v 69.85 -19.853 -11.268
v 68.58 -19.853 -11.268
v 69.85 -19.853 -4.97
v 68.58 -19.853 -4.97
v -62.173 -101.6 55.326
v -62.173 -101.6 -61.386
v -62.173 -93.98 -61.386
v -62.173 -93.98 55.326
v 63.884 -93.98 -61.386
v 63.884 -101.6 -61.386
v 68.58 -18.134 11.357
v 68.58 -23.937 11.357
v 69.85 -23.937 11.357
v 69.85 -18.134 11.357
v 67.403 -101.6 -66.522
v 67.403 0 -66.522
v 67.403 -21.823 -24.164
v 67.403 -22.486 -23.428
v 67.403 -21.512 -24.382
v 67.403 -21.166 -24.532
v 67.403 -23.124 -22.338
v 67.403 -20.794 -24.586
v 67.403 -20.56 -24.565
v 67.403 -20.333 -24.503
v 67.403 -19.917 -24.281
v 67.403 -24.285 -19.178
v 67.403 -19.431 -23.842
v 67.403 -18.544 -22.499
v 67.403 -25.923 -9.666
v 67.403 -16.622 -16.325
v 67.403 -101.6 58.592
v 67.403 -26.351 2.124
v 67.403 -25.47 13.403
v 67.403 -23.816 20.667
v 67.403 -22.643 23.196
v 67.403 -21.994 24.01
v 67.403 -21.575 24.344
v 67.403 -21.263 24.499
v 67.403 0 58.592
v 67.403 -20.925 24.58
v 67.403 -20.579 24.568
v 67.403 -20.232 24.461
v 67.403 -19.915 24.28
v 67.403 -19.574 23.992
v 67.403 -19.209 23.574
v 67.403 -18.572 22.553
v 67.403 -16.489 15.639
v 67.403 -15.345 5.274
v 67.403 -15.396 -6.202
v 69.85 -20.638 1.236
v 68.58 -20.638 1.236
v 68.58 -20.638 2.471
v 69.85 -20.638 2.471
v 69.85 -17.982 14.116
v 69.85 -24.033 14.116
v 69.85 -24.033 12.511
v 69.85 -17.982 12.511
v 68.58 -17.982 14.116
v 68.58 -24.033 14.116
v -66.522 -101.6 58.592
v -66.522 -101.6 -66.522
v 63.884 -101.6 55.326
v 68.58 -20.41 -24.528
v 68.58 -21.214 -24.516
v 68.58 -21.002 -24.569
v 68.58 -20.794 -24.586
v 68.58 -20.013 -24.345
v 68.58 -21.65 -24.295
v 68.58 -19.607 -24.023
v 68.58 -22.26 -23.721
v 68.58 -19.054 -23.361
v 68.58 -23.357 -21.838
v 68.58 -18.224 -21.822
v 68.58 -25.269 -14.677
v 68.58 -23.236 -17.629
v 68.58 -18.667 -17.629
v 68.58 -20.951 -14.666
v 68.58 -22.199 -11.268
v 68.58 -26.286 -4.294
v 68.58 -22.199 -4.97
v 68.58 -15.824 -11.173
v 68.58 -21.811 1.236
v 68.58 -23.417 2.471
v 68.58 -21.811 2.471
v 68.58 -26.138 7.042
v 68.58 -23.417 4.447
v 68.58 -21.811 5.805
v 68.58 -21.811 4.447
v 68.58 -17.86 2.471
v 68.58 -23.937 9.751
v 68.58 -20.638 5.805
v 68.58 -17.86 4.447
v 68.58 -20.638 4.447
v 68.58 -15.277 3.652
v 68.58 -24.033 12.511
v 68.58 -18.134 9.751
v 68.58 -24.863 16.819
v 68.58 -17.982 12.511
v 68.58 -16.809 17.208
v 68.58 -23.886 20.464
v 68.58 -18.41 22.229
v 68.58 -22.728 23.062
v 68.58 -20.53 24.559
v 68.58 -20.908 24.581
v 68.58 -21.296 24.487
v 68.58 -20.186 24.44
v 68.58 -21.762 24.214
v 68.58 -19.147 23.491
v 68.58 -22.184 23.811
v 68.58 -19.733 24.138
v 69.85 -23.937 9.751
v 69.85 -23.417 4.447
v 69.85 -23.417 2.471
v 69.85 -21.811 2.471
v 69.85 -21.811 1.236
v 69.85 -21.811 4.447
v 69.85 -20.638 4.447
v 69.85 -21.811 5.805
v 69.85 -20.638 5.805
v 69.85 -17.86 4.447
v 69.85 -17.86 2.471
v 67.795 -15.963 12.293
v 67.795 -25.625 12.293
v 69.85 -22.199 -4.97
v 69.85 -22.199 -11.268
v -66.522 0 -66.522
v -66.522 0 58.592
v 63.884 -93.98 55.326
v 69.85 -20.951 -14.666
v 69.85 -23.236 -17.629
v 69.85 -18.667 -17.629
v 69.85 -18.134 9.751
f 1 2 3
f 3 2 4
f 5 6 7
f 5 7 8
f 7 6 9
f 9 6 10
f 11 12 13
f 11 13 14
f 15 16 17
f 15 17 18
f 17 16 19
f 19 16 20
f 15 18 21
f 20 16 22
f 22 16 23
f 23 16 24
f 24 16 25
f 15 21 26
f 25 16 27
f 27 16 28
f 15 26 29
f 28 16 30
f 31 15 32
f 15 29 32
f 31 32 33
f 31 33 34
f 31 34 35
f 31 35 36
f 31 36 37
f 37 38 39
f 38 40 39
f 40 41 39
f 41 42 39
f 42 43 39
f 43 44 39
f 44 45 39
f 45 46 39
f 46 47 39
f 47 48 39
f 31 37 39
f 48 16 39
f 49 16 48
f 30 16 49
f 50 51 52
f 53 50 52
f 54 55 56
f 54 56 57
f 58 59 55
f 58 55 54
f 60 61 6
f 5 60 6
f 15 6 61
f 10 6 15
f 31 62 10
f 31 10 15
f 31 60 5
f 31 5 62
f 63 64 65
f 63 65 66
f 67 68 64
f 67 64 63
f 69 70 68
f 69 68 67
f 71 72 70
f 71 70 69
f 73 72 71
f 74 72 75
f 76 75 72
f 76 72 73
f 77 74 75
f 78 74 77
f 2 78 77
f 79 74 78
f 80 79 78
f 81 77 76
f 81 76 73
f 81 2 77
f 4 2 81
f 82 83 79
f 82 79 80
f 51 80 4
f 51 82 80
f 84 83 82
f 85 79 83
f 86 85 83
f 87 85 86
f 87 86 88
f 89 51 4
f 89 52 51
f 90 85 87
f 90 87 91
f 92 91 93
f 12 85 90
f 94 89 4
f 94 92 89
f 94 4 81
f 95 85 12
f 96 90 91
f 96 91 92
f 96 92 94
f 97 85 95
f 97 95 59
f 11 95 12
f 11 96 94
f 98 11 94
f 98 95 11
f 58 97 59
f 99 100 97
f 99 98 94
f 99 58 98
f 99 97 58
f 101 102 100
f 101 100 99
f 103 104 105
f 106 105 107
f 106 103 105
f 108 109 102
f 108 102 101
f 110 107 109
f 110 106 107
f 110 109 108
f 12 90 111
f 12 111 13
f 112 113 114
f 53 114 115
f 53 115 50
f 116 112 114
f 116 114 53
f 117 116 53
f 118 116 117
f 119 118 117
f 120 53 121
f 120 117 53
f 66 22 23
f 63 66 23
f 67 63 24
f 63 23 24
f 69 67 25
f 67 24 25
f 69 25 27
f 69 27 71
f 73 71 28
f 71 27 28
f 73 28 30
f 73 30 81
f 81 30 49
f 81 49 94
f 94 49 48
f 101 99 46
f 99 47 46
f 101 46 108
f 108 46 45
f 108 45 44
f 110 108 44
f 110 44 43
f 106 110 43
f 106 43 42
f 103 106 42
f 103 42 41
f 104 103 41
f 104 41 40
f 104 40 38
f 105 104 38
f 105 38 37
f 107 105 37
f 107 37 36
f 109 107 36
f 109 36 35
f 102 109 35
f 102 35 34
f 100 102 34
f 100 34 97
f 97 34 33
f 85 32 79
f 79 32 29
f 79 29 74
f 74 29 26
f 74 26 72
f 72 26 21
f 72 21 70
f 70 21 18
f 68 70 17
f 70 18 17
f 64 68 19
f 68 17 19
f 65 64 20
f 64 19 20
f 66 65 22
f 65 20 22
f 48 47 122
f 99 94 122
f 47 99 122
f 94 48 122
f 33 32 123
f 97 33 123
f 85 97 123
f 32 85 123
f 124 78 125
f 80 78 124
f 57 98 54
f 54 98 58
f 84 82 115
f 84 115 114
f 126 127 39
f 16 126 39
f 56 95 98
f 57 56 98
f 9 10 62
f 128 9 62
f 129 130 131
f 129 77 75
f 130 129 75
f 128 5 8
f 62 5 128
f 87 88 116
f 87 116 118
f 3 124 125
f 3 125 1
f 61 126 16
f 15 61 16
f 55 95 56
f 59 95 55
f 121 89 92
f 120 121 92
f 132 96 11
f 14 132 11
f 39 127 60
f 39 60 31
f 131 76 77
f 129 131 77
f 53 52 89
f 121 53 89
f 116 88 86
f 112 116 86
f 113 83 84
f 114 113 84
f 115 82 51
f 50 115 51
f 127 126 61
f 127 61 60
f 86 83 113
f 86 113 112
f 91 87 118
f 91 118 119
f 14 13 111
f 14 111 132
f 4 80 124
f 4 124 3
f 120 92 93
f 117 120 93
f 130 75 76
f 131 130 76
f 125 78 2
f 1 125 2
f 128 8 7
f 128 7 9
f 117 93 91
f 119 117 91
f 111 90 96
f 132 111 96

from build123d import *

# Parameters (mm, degrees)
F0_W      = 133.9241117239
F0_H      = 125.1133196056
F1_DEPTH  = 101.6
F2_W      = 126.0571889579
F2_H      = 116.7119294405
F3_DEPTH  = 7.62
F5_DEPTH  = 68.58
F6_W      = 6.050657481
F6_H      = 1.6052769497
F7_DEPTH  = 69.85
F8_W      = 5.8036912233
F8_H      = 1.6052750871
F9_DEPTH  = 69.85
F10_W     = 1.605277881
F10_H     = 1.975722611
F10_W_2   = 1.1730855331
F10_H_2   = 1.2348302407
F10_W_3   = 2.7783634141
F10_H_3   = 1.3583111577
F11_DEPTH = 69.85
F13_DEPTH = 69.85
F14_W     = 2.3461729288
F14_H     = 6.297617685
F15_DEPTH = 69.85


with BuildPart() as f1:
    # F0 (on Front) → F1 (new body)
    with BuildSketch(Plane.XZ):
        with Locations((0.4405379295, -3.9648581296)):
            Rectangle(F0_W, F0_H)
    extrude(amount=F1_DEPTH)

    # F2 (on face) → F3 (cut)
    with BuildSketch(Plane.XZ.offset(101.6)):
        with Locations((0.8558873087, -3.030333668)):
            Rectangle(F2_W, F2_H)
    extrude(amount=-F3_DEPTH, mode=Mode.SUBTRACT)

    # F4 (on Right) → F5 (join)
    with BuildSketch(Plane.YZ):
        with BuildLine():
            add(Edge.make_bspline(
                [(-20.7936801016, -24.5864875615), (-11.1313539485, -24.5864875615), (-15.9625170251, 12.2932437807), (-20.7936801016, 49.1729751229), (-25.6248431782, 12.2932437807), (-30.4560062548, -24.5864875615), (-20.7936801016, -24.5864875615)],
                knots=[0, 0, 0, 2.0943951024, 2.0943951024, 4.1887902048, 4.1887902048, 6.2831853072, 6.2831853072, 6.2831853072], degree=2, weights=[1, 0.5, 1, 0.5, 1, 0.5, 1]))
        make_face()
    extrude(amount=F5_DEPTH)

    # F6 (on Right) → F7 (join)
    with BuildSketch(Plane.YZ):
        with Locations((-21.0075564682, 13.3131914772)):
            Rectangle(F6_W, F6_H)
    extrude(amount=F7_DEPTH)

    # F8 (on Right) → F9 (join)
    with BuildSketch(Plane.YZ):
        with Locations((-21.0355212912, 10.5541222729)):
            Rectangle(F8_W, F8_H)
    extrude(amount=F9_DEPTH)

    # F10 (on Right) → F11 (join)
    with BuildSketch(Plane.YZ):
        with Locations((-22.6139808074, 3.4591723233)):
            Rectangle(F10_W, F10_H)
        with Locations((-21.2247991003, 3.4591723233)):
            Rectangle(F10_W_2, F10_H)
        with Locations((-21.2247991003, 1.8538958975)):
            Rectangle(F10_W_2, F10_H_2)
        with Locations((-19.2490746267, 3.4591723233)):
            Rectangle(F10_W_3, F10_H)
        with Locations((-21.2247991003, 5.1261892077)):
            Rectangle(F10_W_2, F10_H_3)
    extrude(amount=F11_DEPTH)

    # F12 (on Right) → F13 (join)
    with BuildSketch(Plane.YZ):
        Polygon((-20.9511611611, -14.6655198187), (-23.2355929911, -17.6291037351), (-18.666729331, -17.6291037351), align=None)
    extrude(amount=F13_DEPTH)

    # F14 (on Right) → F15 (join)
    with BuildSketch(Plane.YZ):
        with Locations((-21.0262555629, -8.1192564685)):
            Rectangle(F14_W, F14_H)
    extrude(amount=F15_DEPTH)


solid = f1.part
